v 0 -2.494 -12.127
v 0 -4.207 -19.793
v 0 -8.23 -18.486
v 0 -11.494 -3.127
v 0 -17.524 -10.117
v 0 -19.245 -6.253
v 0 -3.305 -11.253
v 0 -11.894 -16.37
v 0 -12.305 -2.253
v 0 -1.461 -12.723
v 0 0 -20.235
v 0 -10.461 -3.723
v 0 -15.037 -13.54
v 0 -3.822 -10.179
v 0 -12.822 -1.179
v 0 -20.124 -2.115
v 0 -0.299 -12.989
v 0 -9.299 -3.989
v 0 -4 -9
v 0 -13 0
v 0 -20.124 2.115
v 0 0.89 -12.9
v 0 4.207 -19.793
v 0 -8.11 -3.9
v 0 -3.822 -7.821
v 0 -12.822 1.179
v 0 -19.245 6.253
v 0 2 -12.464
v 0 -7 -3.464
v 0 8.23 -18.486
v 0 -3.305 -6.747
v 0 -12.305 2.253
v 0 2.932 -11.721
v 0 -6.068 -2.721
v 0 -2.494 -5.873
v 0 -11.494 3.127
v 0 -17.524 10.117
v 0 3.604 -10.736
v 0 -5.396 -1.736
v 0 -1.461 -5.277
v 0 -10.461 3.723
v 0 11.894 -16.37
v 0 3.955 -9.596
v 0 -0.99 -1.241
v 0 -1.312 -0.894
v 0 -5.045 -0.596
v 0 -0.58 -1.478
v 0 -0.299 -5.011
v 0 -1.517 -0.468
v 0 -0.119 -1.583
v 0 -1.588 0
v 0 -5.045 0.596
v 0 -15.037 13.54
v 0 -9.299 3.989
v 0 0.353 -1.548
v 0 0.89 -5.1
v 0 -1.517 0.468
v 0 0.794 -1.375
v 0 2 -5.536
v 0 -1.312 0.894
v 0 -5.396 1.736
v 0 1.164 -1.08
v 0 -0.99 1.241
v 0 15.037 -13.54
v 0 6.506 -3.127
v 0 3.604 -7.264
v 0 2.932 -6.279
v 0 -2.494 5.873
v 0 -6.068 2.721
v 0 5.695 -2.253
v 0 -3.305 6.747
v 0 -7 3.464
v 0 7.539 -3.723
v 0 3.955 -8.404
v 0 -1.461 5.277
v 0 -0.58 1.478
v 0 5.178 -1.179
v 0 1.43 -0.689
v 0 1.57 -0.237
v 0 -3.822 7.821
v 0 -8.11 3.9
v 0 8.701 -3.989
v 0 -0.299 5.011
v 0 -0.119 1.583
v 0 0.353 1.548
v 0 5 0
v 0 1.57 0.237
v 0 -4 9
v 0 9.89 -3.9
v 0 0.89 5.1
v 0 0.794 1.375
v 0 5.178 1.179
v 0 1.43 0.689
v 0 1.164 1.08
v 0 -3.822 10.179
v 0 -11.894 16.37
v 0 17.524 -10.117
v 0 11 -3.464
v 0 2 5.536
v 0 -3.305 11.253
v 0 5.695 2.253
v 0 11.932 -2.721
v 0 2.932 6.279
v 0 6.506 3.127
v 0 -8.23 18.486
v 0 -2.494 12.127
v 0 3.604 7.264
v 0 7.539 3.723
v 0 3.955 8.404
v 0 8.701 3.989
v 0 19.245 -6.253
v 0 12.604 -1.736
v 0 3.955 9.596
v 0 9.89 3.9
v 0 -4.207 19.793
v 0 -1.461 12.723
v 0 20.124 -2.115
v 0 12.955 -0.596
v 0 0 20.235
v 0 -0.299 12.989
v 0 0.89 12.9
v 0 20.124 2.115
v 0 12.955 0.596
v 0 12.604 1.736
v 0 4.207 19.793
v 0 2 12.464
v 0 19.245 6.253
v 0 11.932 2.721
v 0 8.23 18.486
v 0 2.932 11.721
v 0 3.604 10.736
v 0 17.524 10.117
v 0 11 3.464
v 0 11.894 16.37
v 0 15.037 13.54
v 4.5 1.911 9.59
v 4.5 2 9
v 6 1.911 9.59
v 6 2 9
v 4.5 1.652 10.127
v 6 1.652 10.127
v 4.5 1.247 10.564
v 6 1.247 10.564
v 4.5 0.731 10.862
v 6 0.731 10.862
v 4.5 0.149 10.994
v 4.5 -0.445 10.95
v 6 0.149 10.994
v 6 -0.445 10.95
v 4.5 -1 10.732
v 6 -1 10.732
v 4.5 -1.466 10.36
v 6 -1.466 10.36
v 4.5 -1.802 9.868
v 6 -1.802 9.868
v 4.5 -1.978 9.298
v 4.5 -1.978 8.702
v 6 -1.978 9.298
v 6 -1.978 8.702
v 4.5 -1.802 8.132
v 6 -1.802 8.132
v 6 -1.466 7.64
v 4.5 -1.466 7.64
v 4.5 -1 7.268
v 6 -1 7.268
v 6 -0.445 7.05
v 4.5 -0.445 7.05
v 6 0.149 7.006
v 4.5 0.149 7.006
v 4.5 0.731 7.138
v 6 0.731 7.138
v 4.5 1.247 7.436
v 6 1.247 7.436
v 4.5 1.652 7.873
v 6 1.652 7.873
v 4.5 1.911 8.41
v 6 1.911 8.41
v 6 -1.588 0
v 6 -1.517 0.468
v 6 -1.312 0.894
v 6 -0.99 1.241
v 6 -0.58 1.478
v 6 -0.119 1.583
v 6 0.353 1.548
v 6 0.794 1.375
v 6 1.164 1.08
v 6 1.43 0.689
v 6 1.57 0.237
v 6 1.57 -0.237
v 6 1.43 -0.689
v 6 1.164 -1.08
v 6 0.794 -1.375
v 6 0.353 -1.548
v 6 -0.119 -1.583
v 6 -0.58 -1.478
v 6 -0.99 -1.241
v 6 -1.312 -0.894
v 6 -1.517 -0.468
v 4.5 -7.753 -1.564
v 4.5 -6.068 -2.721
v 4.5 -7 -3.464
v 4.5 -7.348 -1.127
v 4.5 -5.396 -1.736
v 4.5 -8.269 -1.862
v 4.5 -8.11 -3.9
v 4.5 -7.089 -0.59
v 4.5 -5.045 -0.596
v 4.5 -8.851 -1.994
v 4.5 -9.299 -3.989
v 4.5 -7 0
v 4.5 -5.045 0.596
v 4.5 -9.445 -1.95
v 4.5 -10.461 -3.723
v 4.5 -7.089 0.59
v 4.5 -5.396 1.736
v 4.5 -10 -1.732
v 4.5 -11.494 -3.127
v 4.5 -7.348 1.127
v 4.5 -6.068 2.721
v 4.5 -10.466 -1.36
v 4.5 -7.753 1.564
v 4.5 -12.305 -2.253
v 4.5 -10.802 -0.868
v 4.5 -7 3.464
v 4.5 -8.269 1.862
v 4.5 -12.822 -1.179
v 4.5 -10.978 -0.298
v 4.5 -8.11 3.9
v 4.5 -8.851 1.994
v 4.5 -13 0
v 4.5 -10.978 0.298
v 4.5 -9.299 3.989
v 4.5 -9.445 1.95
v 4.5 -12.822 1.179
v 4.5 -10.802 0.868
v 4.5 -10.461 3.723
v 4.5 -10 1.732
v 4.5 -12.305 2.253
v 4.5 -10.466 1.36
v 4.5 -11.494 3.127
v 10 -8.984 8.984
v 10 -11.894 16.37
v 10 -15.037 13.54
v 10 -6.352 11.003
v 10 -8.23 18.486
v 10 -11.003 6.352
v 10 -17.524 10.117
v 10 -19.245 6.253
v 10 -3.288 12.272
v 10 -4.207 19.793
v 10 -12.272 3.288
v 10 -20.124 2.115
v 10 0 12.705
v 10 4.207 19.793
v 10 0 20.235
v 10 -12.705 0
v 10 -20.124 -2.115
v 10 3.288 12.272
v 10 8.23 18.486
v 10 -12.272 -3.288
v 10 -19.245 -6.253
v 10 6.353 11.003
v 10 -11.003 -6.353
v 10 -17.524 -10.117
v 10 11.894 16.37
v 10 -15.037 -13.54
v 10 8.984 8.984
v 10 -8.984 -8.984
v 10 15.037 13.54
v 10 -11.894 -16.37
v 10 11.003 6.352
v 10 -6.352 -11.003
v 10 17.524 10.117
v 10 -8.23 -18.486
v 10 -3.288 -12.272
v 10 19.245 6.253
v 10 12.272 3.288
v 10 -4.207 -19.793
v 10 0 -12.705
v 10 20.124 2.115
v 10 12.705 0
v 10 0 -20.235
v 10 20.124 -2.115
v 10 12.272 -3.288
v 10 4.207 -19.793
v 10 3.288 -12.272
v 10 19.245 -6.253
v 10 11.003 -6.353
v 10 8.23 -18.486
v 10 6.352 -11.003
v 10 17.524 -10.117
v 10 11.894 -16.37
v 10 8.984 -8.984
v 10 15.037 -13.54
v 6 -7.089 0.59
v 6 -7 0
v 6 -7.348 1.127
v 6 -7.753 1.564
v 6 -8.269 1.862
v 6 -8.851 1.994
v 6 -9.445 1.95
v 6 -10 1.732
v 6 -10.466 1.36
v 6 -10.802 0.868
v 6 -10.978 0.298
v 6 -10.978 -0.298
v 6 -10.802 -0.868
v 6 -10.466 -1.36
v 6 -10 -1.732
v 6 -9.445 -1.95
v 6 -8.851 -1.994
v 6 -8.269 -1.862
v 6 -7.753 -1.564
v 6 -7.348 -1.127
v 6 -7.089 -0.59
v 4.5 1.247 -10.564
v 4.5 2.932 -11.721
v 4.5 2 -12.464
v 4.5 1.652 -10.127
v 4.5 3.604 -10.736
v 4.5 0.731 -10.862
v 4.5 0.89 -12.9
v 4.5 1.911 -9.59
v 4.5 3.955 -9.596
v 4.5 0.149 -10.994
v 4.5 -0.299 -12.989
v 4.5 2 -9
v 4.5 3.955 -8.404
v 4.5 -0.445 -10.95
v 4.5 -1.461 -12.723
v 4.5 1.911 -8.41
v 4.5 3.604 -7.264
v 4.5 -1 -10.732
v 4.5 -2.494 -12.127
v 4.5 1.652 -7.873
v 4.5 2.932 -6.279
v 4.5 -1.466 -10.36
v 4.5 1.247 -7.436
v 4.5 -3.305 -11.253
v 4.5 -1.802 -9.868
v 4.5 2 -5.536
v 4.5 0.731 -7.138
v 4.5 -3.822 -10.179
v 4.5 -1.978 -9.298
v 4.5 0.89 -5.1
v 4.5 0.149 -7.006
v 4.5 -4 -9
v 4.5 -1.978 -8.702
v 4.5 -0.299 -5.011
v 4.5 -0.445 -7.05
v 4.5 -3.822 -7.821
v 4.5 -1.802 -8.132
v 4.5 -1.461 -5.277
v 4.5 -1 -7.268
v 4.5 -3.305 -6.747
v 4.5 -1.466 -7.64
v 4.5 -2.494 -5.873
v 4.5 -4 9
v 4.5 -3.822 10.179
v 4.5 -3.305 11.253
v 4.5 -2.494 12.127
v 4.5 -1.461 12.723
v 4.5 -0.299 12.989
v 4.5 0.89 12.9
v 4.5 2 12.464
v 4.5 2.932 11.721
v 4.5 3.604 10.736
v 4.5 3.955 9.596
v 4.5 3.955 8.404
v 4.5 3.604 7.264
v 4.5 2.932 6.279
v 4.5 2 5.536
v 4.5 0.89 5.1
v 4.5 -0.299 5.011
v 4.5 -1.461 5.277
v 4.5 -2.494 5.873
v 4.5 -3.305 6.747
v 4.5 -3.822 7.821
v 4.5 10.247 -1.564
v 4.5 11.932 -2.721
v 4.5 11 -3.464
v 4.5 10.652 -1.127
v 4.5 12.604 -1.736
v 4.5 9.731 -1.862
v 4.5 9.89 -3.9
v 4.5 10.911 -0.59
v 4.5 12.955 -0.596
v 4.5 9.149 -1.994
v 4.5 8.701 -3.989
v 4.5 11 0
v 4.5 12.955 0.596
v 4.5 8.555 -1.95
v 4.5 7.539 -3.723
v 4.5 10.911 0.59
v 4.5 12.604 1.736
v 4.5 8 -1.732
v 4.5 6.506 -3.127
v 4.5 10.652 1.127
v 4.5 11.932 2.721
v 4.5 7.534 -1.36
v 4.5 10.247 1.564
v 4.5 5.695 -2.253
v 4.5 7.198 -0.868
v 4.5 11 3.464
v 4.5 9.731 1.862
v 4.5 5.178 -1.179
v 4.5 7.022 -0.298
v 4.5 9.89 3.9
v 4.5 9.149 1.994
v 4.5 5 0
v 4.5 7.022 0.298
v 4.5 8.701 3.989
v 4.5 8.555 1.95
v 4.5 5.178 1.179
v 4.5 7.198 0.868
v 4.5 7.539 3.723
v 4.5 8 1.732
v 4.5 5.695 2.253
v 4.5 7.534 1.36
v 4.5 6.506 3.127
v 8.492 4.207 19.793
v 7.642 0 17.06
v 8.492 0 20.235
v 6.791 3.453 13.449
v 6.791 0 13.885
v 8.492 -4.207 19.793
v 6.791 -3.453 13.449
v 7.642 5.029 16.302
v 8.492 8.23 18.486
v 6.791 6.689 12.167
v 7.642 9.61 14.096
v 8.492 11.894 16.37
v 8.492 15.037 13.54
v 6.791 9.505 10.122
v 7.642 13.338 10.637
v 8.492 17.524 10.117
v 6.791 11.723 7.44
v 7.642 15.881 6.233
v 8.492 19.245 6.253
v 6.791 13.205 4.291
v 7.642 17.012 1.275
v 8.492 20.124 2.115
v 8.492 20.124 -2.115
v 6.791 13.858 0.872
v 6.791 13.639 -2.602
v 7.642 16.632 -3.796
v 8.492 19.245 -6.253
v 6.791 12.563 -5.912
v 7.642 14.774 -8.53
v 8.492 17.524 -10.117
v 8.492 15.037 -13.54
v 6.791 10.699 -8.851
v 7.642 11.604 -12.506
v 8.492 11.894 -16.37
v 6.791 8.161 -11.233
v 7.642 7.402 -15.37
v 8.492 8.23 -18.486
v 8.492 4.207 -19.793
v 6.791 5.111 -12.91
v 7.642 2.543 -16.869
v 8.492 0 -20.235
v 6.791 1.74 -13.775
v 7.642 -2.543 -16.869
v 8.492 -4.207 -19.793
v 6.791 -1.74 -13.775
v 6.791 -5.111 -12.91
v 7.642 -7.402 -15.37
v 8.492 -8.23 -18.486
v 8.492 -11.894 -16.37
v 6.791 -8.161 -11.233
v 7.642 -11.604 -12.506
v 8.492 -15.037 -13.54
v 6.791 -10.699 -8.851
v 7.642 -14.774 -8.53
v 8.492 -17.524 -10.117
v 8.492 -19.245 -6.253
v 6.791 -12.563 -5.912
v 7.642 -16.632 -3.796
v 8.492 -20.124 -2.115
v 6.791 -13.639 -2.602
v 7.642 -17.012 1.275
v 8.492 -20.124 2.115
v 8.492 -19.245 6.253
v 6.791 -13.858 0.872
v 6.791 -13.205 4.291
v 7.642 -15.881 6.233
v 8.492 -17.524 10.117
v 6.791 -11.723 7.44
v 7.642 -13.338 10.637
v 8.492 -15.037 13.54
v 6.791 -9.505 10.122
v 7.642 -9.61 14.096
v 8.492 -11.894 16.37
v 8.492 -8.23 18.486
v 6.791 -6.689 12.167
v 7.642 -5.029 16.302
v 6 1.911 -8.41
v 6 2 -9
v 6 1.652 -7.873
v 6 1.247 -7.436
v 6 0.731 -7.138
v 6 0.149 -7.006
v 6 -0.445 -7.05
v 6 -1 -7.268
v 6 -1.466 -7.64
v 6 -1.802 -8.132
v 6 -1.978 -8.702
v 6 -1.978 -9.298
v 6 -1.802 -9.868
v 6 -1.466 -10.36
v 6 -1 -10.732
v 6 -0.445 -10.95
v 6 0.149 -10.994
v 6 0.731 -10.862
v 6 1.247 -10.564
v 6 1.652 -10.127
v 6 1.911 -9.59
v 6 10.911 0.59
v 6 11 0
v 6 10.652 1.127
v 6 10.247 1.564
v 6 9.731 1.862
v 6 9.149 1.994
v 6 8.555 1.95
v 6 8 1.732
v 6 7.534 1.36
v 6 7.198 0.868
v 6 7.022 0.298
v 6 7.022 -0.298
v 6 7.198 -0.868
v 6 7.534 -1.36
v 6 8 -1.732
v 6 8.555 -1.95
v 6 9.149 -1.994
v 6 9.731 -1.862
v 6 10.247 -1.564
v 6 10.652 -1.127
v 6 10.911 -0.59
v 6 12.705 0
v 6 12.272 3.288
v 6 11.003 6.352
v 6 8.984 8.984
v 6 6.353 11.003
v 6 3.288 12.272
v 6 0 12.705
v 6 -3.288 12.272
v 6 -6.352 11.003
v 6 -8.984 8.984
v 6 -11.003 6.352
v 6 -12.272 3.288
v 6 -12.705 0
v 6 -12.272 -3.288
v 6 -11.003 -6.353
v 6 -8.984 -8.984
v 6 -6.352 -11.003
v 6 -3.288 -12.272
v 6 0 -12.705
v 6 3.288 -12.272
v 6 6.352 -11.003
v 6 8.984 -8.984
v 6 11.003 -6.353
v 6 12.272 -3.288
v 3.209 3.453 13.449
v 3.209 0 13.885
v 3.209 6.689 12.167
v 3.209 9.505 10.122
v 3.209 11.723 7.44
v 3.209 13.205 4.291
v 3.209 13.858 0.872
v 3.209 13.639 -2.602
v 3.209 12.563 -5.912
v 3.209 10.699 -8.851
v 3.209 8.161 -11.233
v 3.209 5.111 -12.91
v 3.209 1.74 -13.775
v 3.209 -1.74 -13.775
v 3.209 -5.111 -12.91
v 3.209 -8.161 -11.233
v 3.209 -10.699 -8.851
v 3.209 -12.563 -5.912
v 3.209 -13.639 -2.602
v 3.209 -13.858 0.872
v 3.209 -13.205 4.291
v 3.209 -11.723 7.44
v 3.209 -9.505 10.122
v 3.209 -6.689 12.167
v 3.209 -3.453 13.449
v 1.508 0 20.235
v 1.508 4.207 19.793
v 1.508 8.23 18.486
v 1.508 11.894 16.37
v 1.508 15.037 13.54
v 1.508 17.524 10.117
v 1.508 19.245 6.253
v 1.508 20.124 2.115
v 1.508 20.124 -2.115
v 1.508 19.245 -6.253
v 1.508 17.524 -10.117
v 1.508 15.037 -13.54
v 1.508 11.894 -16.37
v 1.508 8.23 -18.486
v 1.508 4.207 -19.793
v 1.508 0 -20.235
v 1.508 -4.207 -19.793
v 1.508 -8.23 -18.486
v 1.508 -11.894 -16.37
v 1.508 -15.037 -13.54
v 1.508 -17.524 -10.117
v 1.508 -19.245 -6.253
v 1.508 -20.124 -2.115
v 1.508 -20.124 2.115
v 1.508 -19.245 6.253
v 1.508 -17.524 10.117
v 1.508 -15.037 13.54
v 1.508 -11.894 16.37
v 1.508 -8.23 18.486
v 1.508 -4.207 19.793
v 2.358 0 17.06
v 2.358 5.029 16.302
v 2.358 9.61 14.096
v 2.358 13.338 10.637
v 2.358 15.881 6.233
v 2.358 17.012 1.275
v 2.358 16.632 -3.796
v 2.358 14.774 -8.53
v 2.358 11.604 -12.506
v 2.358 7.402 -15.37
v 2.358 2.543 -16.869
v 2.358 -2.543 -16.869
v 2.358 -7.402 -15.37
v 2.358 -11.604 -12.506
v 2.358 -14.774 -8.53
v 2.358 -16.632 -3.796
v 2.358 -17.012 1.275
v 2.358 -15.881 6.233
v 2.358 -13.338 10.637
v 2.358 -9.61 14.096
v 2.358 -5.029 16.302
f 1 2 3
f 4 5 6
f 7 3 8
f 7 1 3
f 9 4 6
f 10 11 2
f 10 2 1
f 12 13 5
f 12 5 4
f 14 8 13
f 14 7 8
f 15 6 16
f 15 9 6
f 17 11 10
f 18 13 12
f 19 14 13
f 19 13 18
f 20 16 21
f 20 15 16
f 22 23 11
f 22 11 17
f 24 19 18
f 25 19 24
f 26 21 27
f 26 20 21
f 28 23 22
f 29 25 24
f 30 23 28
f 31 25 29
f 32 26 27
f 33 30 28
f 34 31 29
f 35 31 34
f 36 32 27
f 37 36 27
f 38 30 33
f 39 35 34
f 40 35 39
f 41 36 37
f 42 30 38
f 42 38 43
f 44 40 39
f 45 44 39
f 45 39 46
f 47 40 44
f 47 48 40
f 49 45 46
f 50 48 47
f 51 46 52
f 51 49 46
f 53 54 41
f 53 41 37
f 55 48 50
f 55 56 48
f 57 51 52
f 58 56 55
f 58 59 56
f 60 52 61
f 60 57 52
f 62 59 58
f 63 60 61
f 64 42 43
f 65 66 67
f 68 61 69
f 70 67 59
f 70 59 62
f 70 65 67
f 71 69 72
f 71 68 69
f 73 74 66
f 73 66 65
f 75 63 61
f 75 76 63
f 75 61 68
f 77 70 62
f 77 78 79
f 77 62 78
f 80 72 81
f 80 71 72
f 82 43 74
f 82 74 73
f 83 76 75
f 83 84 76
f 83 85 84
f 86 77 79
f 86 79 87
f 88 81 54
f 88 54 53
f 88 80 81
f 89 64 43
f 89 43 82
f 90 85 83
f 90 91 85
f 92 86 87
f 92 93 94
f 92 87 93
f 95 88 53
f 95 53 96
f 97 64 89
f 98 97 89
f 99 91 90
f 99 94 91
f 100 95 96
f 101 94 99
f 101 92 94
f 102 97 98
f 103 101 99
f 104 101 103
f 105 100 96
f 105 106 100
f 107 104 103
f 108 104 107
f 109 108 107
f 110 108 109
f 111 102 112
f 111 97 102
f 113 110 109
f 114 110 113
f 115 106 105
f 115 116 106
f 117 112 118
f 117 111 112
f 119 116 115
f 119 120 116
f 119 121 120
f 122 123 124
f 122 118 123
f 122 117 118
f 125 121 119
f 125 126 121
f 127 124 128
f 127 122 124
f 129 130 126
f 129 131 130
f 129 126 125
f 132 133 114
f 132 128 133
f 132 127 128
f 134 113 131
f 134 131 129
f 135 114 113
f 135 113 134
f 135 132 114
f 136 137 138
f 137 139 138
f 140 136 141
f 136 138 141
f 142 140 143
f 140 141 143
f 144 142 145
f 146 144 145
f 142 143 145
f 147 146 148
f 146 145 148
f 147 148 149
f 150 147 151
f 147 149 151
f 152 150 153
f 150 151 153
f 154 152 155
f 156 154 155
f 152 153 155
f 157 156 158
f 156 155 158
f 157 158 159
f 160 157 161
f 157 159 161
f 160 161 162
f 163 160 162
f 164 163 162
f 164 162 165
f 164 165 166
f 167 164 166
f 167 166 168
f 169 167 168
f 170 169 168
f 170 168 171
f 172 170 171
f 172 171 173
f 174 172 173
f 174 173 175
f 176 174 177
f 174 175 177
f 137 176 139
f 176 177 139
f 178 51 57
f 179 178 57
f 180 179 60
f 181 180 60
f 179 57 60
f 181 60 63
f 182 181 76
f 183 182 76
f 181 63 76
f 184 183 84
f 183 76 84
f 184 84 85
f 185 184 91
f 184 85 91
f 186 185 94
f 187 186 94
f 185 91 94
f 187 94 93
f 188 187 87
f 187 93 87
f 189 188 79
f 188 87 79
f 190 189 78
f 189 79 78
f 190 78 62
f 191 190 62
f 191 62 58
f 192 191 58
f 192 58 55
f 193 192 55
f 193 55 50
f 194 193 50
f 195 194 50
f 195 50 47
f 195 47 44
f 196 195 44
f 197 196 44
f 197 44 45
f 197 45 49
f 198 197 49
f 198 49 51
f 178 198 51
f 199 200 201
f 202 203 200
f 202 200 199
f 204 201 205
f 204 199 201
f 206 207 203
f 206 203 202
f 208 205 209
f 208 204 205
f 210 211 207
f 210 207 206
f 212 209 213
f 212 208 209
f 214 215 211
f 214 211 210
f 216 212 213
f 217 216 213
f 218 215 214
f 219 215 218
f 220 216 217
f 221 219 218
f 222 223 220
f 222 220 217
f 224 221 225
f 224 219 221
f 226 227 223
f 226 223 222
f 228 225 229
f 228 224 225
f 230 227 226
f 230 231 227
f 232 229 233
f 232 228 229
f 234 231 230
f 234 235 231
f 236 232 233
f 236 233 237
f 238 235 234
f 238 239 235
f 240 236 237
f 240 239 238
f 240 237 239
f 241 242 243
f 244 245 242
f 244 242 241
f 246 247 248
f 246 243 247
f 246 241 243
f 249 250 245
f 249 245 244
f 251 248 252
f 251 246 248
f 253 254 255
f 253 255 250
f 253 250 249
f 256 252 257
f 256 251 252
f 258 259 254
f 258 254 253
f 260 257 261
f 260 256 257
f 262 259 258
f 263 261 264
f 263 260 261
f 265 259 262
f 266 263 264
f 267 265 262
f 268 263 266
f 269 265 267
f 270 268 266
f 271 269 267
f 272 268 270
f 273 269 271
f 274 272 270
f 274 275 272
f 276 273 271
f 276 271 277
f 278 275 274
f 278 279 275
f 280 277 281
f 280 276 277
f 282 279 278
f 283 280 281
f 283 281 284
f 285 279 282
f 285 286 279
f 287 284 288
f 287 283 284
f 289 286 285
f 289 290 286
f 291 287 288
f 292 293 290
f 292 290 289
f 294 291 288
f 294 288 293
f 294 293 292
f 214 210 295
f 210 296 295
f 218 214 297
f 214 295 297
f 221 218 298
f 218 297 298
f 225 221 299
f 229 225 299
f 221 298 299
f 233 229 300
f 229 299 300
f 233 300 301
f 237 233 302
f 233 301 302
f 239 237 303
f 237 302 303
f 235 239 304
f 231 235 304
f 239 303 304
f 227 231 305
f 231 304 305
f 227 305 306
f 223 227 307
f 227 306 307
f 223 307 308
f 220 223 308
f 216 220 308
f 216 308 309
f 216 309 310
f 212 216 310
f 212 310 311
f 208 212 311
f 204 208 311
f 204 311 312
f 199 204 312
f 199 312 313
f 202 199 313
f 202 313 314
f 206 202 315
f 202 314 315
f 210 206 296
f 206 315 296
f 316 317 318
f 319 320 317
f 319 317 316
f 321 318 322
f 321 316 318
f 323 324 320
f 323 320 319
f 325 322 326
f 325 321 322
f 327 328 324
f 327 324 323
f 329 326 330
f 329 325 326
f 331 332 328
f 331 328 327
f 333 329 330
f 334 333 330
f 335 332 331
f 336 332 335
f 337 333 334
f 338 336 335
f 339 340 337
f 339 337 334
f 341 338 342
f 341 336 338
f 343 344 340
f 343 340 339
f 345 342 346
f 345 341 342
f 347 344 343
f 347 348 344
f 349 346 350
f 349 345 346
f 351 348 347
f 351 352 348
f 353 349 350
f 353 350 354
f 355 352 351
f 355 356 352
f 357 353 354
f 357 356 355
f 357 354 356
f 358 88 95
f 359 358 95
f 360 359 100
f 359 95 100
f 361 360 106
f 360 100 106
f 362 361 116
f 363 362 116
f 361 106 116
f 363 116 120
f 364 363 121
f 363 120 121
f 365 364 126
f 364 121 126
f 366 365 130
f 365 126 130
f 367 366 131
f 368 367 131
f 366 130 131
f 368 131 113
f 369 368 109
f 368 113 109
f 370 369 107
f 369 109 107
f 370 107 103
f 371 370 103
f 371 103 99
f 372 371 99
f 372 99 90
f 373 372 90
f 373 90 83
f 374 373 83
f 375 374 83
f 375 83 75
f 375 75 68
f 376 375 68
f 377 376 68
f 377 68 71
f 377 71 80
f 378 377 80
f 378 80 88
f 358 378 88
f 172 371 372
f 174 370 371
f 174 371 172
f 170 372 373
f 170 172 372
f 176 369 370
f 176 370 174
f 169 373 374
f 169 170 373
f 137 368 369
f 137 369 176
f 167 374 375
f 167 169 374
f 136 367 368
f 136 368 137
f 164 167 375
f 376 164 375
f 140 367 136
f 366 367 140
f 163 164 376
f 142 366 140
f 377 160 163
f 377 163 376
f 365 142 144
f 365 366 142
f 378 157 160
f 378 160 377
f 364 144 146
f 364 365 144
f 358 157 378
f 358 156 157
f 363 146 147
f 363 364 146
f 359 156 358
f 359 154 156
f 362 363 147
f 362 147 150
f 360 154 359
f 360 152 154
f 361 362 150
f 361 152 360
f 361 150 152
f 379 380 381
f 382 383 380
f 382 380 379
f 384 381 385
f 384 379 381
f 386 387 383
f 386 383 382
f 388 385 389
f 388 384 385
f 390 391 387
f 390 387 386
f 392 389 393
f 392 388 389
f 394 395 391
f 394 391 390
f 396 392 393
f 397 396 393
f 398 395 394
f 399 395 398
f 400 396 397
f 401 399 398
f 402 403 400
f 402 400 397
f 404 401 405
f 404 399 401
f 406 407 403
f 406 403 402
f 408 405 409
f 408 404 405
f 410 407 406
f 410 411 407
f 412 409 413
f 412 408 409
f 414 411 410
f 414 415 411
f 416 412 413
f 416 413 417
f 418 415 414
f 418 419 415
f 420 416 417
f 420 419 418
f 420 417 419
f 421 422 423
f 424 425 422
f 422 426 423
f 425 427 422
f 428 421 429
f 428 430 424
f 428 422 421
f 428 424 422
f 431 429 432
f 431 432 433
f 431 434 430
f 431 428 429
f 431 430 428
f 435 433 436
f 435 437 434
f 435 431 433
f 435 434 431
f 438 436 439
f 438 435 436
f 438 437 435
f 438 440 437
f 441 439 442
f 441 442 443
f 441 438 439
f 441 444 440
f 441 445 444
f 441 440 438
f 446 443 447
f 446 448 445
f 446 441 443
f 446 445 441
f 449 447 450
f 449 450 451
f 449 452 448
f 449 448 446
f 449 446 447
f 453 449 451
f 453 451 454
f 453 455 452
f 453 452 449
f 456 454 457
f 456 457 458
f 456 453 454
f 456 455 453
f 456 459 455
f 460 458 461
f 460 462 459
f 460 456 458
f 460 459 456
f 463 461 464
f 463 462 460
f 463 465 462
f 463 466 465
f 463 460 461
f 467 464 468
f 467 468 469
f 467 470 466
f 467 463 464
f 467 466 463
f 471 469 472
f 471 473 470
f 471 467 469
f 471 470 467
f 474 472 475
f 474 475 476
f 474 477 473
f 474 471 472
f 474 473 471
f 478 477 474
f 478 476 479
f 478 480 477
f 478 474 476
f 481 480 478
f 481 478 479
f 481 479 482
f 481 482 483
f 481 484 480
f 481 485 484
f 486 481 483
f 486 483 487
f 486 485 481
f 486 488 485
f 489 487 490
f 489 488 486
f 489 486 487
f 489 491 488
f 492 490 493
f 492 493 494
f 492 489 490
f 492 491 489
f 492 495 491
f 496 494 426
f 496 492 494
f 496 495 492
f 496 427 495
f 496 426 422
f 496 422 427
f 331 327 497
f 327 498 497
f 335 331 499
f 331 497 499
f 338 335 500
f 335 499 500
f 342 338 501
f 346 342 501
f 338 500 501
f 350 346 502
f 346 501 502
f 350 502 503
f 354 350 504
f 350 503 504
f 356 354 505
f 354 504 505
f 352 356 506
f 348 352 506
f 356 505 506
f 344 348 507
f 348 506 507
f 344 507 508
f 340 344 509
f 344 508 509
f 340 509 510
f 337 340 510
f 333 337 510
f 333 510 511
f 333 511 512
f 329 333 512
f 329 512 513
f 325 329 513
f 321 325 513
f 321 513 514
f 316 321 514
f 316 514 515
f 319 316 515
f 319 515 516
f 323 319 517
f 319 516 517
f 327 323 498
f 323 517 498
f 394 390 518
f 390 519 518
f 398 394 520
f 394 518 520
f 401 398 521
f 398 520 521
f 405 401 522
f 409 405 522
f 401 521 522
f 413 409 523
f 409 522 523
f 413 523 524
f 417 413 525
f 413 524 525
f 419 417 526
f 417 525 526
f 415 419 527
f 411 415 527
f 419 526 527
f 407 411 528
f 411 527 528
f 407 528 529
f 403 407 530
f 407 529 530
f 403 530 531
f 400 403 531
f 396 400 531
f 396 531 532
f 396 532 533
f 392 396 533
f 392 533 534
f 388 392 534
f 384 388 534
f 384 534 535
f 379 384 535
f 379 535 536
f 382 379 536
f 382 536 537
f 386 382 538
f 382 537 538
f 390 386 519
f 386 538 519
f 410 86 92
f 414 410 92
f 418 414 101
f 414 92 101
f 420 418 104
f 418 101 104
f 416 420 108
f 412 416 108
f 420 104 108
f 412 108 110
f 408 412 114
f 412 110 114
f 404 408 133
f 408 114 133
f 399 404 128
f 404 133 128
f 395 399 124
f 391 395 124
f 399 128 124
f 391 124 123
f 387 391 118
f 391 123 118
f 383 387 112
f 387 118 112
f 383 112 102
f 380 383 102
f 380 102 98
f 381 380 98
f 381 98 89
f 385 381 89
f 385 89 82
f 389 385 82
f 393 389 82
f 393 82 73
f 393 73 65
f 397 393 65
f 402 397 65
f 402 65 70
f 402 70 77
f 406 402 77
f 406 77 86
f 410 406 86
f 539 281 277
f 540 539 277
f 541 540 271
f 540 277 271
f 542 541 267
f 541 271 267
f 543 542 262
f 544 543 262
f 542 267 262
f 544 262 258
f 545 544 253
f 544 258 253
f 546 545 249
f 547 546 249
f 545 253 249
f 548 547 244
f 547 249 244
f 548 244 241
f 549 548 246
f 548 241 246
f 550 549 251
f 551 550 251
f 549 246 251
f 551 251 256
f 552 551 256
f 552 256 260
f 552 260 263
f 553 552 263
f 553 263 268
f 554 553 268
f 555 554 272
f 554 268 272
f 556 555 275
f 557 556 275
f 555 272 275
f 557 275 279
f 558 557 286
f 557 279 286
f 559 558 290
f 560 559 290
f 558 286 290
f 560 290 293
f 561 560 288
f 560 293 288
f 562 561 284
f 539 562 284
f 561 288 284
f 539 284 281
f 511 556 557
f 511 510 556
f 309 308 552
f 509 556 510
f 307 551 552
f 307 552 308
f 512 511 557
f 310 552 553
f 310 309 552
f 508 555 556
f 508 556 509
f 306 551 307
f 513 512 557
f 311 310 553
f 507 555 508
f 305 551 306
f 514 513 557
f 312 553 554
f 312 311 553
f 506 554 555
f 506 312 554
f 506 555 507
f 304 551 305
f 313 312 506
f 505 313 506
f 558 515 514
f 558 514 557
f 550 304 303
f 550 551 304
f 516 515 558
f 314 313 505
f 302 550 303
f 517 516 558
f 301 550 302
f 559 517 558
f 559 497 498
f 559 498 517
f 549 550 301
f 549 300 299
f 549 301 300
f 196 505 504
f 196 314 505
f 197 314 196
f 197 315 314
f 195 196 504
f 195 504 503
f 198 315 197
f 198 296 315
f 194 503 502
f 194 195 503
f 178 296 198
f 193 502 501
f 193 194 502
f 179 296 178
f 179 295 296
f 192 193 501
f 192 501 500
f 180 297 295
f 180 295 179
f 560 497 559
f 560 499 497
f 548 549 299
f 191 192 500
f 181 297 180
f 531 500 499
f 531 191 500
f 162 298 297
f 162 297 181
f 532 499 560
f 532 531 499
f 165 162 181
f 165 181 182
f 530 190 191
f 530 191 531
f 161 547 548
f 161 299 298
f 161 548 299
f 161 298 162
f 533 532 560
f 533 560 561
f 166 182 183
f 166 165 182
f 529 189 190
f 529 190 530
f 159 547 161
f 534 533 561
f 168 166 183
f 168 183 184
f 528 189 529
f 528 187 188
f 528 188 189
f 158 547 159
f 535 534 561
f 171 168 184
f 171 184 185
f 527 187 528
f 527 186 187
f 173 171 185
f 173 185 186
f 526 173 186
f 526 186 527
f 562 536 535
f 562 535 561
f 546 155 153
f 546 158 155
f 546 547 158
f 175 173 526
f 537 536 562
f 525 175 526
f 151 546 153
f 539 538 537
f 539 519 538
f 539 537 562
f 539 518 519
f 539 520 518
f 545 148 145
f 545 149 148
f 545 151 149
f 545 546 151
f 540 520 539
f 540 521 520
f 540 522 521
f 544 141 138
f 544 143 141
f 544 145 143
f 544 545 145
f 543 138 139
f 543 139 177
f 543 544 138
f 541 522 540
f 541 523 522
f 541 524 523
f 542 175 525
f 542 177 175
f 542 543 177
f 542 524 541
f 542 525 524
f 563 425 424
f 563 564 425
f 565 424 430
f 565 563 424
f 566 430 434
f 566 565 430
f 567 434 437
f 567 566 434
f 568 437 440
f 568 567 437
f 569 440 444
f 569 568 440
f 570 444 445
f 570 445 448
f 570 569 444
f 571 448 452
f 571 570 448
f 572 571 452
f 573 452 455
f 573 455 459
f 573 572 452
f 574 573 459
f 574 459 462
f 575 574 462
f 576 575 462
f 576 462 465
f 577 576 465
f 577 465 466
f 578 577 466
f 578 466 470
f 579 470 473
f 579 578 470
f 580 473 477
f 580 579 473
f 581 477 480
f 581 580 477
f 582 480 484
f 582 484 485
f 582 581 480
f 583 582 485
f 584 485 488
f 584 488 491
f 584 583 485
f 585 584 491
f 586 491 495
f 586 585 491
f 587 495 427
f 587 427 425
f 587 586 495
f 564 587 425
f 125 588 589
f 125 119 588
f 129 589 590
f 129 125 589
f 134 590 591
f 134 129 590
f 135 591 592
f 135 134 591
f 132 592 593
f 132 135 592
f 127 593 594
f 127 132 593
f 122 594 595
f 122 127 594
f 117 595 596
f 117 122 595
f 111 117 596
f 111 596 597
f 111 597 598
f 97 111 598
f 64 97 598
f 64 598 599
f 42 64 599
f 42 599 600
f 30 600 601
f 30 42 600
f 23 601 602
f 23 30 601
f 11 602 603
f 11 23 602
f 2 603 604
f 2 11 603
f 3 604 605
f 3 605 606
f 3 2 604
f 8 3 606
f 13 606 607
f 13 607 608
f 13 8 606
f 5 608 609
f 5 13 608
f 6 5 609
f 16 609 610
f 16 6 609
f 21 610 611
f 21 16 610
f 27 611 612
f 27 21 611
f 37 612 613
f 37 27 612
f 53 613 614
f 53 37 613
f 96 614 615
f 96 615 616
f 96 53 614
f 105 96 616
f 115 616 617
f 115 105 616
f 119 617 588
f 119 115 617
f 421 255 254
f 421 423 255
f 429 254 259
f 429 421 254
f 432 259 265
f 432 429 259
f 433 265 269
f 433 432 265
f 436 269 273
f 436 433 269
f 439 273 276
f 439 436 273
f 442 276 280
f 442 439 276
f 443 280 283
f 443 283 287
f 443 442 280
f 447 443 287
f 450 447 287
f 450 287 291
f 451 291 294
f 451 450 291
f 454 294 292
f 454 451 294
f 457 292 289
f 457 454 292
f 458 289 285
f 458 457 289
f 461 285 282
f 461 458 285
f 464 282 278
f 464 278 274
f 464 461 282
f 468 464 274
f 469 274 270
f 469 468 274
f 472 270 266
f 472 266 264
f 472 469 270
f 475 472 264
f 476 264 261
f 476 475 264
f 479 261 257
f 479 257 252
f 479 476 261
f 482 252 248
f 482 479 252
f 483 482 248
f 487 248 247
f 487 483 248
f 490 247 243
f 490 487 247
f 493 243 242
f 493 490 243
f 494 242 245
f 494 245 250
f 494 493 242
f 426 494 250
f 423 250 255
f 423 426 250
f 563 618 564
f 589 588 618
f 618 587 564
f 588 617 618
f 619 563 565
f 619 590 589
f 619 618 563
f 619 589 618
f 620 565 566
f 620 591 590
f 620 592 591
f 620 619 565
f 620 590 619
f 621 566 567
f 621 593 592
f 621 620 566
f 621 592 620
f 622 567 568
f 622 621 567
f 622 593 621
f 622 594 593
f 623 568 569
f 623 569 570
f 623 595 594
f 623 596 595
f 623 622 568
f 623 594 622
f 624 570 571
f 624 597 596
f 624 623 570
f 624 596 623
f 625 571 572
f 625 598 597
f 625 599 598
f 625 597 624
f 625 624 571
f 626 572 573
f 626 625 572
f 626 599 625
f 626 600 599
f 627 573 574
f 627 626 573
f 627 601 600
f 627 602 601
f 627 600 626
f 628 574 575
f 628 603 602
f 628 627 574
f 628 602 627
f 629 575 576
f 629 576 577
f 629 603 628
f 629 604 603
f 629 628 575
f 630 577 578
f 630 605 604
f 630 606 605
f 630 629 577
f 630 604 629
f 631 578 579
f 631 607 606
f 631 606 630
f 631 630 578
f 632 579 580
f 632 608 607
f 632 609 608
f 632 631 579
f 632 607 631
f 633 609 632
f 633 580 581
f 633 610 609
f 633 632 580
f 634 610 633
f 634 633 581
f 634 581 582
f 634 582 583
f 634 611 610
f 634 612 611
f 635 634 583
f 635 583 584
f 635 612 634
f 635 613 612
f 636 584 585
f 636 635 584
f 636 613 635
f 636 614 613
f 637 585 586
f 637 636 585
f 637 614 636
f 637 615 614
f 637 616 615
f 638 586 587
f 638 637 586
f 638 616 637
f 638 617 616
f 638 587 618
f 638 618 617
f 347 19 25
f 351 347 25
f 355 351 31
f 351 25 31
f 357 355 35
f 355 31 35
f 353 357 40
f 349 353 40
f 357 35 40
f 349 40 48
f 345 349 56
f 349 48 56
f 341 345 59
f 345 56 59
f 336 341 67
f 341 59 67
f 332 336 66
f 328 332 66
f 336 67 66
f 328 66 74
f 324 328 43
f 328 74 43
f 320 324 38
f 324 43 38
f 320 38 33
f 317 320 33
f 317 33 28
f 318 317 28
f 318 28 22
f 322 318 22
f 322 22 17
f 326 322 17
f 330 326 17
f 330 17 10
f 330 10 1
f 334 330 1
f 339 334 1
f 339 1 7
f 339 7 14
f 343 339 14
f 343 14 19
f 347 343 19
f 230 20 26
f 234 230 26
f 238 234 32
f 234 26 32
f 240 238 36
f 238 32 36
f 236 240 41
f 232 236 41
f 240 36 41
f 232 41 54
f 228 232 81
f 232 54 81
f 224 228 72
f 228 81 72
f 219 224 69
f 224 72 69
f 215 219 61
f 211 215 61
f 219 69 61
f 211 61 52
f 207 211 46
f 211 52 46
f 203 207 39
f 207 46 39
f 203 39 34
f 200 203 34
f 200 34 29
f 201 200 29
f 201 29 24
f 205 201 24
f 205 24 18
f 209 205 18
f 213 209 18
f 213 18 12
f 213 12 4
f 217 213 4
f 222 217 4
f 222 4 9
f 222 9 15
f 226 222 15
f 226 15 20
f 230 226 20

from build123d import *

# Parameters (mm, degrees)
F2_R           = 12.705
F3_DEPTH       = 4
F5_D           = 4
F5_CBORE_D     = 8
F5_CBORE_DEPTH = 4.5
F6_R           = 1.5875
F7_DEPTH       = 10.001


with BuildPart() as f1:
    # F0 (on Front) → F1 (revolve)
    with BuildSketch(Plane.XZ):
        Polygon((0, 20.234926), (0, 0), (10, 0), (10, 20.234926), (8.4925, 20.234926), (6.791023, 13.884926), (3.208977, 13.884926), (1.5075, 20.234926), align=None)
    revolve(axis=Axis((5, 0, 0), (-1, 0, 0)))

    # F2 (on face) → F3 (cut)
    with BuildSketch(Plane.YZ.offset(10)):
        Circle(F2_R)
    extrude(amount=-F3_DEPTH, mode=Mode.SUBTRACT)

    # F5 (through all)
    with Locations(Plane(origin=(0, 0, 0), x_dir=(0, -1, 0), z_dir=(-1, 0, 0))):
        with Locations((0, 9), (-9, 0), (0, -9), (9, 0)):
            CounterBoreHole(F5_D / 2, F5_CBORE_D / 2, F5_CBORE_DEPTH)

    # F6 (on face) → F7 (cut, through all)
    with BuildSketch(Plane(origin=(0, 0, 0), x_dir=(0, -1, 0), z_dir=(-1, 0, 0))):
        Circle(F6_R)
    extrude(amount=-F7_DEPTH, mode=Mode.SUBTRACT)


solid = f1.part
